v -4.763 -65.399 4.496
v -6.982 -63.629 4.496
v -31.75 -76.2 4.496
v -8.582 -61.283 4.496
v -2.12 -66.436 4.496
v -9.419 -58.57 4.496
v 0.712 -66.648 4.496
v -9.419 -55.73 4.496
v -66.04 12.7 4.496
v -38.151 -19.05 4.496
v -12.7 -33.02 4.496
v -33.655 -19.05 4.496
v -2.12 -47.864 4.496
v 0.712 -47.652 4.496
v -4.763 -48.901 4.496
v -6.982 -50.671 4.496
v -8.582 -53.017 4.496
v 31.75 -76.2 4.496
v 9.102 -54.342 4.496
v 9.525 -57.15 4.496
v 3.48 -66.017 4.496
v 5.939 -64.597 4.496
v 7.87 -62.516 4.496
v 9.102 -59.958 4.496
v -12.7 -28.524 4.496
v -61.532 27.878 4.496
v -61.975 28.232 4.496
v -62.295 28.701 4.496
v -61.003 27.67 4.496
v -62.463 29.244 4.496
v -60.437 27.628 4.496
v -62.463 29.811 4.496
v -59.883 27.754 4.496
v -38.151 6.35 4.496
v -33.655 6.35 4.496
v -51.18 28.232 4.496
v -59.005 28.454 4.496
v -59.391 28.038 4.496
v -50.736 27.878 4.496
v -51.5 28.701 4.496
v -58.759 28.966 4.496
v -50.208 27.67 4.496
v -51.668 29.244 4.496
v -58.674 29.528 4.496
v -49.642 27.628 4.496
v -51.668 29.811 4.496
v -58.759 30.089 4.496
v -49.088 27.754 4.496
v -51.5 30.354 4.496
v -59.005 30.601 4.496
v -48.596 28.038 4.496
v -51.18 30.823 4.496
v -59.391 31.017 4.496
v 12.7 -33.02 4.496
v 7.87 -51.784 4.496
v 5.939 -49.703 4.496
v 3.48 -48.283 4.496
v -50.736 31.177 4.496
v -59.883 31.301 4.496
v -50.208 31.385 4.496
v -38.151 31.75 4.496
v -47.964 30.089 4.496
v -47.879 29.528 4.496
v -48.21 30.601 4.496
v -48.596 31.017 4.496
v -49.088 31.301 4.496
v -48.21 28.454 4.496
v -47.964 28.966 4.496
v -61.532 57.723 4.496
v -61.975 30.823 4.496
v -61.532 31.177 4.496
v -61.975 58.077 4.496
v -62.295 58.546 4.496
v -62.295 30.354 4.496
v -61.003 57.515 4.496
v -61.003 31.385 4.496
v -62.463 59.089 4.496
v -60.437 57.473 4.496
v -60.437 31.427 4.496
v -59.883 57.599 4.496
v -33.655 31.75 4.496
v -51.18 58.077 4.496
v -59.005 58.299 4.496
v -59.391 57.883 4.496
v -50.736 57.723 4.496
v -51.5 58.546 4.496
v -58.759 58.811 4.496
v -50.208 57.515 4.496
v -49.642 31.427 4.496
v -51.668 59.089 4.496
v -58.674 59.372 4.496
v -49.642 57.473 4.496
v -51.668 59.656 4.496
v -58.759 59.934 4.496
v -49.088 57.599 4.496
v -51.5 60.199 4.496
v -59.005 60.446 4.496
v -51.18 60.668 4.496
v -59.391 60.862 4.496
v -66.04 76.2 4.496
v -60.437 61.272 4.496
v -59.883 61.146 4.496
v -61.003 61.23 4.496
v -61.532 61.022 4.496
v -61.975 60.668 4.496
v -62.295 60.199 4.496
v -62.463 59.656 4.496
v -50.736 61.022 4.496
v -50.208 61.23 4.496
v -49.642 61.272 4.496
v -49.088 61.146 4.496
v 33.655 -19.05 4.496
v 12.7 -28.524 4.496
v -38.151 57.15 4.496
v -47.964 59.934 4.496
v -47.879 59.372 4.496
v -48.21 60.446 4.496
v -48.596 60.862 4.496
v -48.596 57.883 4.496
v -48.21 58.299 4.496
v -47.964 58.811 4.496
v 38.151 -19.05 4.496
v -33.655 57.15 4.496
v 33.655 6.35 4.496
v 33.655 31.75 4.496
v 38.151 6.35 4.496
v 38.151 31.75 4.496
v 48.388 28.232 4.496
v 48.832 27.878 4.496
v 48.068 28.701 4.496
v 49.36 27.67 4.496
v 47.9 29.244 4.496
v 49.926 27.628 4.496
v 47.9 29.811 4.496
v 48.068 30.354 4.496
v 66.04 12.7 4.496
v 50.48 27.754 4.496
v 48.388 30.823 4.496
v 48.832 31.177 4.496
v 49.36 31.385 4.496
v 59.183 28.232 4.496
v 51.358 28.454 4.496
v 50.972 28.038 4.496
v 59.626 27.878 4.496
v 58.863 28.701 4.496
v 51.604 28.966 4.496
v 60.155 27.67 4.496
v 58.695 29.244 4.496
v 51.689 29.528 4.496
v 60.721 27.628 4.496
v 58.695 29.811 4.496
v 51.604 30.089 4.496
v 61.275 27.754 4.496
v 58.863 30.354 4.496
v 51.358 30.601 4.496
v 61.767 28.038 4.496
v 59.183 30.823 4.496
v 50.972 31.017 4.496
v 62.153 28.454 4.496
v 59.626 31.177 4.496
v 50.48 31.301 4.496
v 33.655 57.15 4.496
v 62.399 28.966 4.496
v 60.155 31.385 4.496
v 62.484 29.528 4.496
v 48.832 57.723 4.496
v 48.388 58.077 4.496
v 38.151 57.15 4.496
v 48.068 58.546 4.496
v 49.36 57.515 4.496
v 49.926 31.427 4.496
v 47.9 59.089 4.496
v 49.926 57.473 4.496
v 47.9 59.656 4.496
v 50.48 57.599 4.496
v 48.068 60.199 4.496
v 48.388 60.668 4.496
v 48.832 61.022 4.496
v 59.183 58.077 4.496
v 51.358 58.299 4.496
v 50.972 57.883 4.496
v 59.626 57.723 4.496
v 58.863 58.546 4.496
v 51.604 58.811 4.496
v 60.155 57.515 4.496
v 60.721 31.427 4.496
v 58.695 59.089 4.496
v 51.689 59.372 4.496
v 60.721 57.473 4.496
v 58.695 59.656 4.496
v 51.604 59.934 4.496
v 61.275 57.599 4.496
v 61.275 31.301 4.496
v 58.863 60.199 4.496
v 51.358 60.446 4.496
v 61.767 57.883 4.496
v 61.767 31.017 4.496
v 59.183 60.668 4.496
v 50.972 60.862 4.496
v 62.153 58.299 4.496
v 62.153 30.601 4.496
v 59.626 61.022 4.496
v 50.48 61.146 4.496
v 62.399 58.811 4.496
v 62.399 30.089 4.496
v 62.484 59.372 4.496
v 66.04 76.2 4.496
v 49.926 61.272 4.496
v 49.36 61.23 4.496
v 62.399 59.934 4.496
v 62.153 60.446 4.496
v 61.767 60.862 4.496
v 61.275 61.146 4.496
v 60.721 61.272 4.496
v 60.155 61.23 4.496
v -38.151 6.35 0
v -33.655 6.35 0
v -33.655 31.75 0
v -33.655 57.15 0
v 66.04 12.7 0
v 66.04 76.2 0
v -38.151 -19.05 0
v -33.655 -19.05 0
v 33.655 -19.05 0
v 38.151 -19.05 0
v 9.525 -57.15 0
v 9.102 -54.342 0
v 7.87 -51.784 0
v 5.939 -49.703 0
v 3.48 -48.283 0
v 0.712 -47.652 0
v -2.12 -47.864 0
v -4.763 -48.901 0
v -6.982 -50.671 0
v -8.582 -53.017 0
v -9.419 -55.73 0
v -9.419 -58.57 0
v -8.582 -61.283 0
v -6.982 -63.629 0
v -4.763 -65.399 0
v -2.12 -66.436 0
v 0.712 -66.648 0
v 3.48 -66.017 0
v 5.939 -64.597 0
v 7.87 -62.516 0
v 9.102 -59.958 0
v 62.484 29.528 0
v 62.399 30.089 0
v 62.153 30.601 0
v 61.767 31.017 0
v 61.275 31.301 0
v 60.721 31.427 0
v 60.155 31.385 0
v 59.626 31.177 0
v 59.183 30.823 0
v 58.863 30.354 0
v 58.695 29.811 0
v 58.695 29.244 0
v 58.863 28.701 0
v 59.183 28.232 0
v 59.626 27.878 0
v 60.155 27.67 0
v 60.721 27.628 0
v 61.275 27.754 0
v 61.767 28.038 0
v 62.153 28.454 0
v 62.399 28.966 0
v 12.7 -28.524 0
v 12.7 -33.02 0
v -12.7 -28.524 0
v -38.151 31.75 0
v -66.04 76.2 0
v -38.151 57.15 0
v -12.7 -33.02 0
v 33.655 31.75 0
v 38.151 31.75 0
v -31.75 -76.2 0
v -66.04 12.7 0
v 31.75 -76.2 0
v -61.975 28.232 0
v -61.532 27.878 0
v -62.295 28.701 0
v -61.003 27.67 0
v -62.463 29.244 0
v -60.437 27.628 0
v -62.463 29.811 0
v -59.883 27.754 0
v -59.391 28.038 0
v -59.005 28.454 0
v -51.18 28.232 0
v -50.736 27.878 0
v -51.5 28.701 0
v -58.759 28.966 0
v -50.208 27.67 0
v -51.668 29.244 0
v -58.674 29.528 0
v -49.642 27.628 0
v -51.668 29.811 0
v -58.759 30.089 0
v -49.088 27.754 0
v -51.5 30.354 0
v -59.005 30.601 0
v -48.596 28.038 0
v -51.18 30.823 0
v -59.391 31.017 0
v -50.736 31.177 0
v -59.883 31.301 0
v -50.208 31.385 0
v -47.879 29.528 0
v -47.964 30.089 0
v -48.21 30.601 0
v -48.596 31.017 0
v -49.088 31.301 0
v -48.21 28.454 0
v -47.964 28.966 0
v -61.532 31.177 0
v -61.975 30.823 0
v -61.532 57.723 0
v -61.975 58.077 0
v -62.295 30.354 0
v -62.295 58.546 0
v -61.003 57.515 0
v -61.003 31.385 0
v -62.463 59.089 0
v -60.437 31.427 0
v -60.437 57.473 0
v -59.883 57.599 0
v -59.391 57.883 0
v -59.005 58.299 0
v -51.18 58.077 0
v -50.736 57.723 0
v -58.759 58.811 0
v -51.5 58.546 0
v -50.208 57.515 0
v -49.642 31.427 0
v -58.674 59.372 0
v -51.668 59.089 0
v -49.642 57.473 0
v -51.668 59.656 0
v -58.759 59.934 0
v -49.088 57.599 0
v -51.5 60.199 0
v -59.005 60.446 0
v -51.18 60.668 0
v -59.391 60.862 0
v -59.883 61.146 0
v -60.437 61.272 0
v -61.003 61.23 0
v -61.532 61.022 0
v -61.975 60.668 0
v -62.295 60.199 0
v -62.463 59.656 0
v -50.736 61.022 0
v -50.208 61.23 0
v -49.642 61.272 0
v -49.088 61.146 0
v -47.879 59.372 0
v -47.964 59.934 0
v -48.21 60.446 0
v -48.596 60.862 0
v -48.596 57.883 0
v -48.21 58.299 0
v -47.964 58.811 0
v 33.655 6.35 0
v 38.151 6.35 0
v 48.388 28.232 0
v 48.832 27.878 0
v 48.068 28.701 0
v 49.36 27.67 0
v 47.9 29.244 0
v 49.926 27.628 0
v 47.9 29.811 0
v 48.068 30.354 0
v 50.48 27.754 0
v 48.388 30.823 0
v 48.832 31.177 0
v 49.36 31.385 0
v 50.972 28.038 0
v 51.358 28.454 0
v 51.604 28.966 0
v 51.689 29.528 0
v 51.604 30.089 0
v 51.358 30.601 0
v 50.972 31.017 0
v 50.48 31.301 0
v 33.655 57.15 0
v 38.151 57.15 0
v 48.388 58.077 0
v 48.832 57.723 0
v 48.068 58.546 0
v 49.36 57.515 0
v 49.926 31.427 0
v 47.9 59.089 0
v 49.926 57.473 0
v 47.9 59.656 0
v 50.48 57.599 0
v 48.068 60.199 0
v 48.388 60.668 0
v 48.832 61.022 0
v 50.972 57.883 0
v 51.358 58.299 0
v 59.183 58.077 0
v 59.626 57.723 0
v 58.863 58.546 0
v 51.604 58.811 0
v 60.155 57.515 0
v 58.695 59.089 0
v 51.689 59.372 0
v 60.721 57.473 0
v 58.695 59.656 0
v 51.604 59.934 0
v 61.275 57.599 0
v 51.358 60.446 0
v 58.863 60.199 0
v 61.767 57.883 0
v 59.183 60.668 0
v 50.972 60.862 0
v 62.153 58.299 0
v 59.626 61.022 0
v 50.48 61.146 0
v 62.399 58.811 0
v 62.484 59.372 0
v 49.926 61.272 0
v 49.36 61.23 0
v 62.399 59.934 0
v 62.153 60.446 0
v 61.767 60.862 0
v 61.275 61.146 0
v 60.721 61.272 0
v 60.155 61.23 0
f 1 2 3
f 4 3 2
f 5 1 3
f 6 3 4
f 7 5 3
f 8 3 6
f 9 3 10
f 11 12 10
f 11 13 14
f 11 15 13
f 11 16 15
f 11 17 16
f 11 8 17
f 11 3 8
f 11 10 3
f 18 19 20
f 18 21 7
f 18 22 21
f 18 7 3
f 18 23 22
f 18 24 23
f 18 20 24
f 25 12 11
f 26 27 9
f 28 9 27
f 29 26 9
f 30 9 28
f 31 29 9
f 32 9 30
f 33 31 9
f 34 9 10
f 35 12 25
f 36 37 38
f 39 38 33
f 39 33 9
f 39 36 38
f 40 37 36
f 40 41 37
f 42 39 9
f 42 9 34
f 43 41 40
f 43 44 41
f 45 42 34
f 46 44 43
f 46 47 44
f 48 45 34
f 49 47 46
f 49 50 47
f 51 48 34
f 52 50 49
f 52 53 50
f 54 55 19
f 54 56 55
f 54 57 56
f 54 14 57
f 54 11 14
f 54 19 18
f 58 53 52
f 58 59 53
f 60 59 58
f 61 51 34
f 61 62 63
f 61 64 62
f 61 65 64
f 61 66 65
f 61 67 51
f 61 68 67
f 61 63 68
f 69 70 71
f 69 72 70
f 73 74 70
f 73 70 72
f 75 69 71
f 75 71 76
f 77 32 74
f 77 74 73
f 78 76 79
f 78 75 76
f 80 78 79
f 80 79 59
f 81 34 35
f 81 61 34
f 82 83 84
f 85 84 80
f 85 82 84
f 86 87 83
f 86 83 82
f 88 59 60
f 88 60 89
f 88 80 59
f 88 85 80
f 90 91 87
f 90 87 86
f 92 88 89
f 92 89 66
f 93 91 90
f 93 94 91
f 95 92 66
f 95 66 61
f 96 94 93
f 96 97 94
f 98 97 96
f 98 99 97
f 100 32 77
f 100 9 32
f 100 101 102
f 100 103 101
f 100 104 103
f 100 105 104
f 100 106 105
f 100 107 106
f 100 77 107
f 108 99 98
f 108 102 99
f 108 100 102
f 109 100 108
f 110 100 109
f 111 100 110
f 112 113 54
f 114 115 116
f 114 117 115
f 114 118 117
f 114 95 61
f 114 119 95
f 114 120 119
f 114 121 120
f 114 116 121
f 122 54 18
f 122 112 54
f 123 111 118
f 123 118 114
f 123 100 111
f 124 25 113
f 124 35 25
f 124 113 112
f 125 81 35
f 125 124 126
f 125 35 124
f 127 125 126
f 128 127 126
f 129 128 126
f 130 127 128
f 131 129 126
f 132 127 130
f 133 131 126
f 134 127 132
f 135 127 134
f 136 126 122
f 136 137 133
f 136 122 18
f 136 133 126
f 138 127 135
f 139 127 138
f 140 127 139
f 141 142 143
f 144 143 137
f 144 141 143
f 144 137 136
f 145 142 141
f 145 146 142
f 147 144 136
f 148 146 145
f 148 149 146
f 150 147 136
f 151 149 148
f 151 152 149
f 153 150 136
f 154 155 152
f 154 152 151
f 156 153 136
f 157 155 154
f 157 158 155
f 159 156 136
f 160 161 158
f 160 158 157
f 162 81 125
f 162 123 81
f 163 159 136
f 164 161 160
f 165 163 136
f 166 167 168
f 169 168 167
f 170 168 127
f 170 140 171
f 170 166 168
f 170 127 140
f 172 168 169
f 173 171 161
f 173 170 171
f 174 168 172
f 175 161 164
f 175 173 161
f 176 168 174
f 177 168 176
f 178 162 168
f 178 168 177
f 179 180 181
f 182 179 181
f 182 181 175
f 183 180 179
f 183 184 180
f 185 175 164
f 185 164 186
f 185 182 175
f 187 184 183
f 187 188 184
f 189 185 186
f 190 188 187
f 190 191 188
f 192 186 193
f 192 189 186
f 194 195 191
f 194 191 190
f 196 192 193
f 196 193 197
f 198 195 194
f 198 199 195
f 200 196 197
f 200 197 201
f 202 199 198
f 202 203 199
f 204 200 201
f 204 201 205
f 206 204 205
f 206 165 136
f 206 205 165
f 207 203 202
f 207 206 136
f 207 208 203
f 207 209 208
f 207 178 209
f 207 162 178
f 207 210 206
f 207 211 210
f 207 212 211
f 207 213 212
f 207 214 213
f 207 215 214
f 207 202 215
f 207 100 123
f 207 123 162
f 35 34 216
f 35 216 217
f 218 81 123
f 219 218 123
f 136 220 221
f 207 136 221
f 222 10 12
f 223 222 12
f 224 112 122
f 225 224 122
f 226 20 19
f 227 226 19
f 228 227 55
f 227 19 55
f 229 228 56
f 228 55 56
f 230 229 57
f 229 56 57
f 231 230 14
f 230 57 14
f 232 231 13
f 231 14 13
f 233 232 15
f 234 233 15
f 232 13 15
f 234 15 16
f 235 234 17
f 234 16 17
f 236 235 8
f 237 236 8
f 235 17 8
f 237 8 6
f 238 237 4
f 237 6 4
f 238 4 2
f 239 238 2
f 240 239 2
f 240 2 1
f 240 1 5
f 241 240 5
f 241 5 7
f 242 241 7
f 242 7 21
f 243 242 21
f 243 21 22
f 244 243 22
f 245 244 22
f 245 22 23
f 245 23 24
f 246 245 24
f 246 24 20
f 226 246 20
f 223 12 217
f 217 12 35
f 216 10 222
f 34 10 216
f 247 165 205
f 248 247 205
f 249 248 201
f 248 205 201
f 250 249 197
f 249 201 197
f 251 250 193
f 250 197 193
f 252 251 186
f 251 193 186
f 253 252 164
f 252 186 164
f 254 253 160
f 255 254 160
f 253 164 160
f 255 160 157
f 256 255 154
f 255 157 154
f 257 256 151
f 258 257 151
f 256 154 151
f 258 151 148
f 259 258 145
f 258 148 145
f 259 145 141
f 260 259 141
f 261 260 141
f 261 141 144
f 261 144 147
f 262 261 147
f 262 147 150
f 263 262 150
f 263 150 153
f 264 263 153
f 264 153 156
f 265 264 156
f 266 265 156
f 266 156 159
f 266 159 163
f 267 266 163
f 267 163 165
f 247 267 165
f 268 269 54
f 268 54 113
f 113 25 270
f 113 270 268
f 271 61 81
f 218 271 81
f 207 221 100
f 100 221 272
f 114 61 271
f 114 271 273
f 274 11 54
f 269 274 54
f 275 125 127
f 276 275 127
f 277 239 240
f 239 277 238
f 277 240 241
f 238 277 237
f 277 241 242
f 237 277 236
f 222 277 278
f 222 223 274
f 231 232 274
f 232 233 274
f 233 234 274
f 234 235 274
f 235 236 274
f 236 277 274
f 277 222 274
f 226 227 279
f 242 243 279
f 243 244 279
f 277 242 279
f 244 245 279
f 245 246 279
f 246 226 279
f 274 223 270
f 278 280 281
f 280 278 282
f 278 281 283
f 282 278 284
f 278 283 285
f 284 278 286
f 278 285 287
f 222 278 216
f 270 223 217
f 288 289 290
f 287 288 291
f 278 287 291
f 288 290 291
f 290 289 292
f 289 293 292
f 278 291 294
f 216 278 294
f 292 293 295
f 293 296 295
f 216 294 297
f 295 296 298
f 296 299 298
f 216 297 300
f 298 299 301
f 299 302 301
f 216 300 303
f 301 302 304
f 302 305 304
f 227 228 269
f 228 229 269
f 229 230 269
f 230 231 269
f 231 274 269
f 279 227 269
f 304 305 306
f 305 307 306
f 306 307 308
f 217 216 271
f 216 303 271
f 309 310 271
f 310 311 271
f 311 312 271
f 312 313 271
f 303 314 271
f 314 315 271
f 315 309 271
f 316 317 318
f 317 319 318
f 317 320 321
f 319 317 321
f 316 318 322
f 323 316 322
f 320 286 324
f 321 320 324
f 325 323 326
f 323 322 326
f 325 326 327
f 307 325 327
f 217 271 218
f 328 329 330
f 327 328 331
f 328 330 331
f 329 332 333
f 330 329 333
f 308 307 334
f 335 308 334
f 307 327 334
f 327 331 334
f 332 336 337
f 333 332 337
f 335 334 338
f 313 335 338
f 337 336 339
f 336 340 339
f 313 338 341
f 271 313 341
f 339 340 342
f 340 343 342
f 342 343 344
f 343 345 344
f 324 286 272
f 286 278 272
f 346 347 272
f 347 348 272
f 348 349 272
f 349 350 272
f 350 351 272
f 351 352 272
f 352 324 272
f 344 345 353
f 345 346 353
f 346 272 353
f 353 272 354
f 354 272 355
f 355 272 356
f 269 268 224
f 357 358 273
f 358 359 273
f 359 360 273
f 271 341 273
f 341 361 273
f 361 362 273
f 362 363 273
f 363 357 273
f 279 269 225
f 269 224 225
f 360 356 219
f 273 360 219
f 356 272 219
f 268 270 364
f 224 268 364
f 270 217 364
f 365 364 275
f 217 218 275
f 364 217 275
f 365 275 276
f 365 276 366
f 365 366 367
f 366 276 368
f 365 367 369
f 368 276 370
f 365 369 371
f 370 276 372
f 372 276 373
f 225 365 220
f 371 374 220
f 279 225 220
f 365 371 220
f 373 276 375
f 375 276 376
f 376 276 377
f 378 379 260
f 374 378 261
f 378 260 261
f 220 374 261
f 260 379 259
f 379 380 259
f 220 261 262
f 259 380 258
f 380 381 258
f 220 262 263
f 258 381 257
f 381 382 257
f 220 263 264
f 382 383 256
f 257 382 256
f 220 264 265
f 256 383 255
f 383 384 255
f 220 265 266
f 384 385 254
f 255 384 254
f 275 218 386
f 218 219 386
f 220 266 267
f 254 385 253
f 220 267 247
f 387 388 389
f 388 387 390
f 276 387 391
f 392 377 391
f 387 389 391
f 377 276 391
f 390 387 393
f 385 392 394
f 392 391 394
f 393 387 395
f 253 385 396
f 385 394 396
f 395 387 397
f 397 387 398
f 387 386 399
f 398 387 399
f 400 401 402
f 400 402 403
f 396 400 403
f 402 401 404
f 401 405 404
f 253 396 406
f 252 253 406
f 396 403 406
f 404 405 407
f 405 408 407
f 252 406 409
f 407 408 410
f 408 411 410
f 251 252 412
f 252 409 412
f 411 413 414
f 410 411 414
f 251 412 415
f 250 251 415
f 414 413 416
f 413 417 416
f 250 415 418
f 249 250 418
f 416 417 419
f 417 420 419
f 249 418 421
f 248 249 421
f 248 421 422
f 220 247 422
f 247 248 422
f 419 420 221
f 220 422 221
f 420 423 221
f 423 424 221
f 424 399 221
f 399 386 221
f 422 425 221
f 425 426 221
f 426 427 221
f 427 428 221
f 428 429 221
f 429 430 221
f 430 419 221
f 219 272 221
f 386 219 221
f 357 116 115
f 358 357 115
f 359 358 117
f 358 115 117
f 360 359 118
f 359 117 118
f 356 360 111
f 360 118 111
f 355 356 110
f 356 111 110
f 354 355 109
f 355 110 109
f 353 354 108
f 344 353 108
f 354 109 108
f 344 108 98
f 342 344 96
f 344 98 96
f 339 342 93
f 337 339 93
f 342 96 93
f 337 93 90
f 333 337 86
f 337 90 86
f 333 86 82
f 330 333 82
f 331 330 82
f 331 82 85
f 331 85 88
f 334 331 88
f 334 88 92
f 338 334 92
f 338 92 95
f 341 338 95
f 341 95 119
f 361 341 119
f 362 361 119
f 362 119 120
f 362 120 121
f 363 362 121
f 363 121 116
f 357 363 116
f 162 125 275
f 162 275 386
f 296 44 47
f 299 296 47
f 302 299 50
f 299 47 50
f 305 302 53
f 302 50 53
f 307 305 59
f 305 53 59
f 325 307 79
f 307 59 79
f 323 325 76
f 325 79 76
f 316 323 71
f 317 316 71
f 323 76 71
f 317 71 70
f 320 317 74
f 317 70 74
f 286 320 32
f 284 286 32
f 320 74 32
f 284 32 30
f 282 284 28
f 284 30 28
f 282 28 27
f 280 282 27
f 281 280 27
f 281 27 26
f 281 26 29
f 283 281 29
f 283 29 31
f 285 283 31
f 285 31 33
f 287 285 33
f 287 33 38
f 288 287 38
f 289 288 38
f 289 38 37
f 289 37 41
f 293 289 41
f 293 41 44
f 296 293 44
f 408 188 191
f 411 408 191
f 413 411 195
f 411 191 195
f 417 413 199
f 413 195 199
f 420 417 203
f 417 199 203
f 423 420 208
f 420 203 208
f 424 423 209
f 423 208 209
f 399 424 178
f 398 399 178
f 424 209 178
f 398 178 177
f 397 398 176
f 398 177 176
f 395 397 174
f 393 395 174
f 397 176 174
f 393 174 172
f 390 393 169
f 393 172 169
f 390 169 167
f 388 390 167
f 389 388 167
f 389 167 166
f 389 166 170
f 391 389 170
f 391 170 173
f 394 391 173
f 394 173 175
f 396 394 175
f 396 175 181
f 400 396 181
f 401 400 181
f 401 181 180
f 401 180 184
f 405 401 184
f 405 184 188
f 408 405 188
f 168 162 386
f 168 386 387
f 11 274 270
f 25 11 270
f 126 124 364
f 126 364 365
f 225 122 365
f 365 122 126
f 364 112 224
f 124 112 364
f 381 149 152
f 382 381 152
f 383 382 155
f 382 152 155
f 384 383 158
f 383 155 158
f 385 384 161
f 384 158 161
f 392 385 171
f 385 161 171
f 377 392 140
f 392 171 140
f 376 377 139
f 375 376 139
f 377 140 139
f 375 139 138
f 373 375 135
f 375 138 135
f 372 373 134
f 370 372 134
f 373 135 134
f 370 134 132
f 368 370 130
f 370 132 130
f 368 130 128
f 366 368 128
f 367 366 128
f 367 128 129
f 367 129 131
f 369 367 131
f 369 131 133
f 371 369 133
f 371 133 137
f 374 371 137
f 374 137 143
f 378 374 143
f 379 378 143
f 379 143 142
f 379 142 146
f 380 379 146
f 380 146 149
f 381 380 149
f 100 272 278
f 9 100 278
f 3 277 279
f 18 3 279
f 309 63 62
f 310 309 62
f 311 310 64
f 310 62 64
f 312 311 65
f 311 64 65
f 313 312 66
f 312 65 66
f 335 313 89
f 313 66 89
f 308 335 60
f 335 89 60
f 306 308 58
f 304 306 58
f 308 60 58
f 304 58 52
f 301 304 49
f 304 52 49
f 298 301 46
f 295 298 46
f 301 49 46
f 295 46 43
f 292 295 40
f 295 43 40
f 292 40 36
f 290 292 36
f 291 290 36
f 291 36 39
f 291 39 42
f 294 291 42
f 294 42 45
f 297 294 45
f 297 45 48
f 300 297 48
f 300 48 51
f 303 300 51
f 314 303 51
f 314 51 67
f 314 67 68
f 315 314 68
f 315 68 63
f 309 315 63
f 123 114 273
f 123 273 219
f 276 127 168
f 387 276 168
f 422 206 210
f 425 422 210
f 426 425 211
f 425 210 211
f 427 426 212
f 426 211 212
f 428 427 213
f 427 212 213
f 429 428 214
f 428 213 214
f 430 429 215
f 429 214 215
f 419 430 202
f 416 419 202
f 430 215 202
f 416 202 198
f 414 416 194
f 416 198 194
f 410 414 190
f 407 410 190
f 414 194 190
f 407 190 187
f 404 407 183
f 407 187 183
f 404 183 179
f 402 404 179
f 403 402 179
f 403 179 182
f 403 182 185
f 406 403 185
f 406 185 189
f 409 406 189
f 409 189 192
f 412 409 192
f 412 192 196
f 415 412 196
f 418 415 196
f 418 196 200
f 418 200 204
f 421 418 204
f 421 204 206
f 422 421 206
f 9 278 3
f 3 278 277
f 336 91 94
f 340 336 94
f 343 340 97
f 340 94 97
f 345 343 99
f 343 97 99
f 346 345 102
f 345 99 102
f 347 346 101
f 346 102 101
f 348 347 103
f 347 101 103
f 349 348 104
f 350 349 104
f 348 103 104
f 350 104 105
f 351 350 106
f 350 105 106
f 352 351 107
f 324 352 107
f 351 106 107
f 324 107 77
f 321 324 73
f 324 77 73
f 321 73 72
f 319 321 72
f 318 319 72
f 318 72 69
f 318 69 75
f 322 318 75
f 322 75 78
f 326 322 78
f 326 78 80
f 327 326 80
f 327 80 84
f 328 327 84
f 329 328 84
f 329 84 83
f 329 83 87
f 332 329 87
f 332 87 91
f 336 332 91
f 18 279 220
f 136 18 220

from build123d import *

# Parameters (mm, degrees)
F1_DEPTH = 4.4958
F2_R     = 1.905
F3_DEPTH = 4.4968
F4_W     = 4.4958
F4_H     = 25.4
F4_R     = 9.525
F4_W_2   = 25.4
F4_H_2   = 4.4958
F5_DEPTH = 4.4968


with BuildPart() as f1:
    # F0 (on Top) → F1 (new body)
    with BuildSketch(Plane.XY):
        Polygon((66.04, 76.2), (-66.04, 76.2), (-66.04, 12.7), (-31.75, -76.2), (31.75, -76.2), (66.04, 12.7), align=None)
    extrude(amount=F1_DEPTH)

    # F2 (on face) → F3 (cut, through all)
    with BuildSketch(Plane.XY.offset(4.4958)):
        with Locations((-60.579, 59.3725)):
            Circle(F2_R)
        with Locations((-49.784, 59.3725)):
            Circle(F2_R)
        with Locations((-49.784, 29.5275)):
            Circle(F2_R)
        with Locations((-60.579, 29.5275)):
            Circle(F2_R)
        with Locations((60.579, 59.3725)):
            Circle(F2_R)
        with Locations((49.784, 29.5275)):
            Circle(F2_R)
        with Locations((49.784, 59.3725)):
            Circle(F2_R)
        with Locations((60.579, 29.5275)):
            Circle(F2_R)
    extrude(amount=-F3_DEPTH, mode=Mode.SUBTRACT)

    # F4 (on face) → F5 (cut, through all)
    with BuildSketch(Plane.XY.offset(4.4958)):
        with Locations((-35.9029, 44.45)):
            Rectangle(F4_W, F4_H)
        with Locations((-35.9029, -6.35)):
            Rectangle(F4_W, F4_H)
        with Locations((35.9029, 44.45)):
            Rectangle(F4_W, F4_H)
        with Locations((35.9029, -6.35)):
            Rectangle(F4_W, F4_H)
        with Locations((0, -57.15)):
            Circle(F4_R)
        with Locations((0, -30.7721)):
            Rectangle(F4_W_2, F4_H_2)
    extrude(amount=-F5_DEPTH, mode=Mode.SUBTRACT)


solid = f1.part
